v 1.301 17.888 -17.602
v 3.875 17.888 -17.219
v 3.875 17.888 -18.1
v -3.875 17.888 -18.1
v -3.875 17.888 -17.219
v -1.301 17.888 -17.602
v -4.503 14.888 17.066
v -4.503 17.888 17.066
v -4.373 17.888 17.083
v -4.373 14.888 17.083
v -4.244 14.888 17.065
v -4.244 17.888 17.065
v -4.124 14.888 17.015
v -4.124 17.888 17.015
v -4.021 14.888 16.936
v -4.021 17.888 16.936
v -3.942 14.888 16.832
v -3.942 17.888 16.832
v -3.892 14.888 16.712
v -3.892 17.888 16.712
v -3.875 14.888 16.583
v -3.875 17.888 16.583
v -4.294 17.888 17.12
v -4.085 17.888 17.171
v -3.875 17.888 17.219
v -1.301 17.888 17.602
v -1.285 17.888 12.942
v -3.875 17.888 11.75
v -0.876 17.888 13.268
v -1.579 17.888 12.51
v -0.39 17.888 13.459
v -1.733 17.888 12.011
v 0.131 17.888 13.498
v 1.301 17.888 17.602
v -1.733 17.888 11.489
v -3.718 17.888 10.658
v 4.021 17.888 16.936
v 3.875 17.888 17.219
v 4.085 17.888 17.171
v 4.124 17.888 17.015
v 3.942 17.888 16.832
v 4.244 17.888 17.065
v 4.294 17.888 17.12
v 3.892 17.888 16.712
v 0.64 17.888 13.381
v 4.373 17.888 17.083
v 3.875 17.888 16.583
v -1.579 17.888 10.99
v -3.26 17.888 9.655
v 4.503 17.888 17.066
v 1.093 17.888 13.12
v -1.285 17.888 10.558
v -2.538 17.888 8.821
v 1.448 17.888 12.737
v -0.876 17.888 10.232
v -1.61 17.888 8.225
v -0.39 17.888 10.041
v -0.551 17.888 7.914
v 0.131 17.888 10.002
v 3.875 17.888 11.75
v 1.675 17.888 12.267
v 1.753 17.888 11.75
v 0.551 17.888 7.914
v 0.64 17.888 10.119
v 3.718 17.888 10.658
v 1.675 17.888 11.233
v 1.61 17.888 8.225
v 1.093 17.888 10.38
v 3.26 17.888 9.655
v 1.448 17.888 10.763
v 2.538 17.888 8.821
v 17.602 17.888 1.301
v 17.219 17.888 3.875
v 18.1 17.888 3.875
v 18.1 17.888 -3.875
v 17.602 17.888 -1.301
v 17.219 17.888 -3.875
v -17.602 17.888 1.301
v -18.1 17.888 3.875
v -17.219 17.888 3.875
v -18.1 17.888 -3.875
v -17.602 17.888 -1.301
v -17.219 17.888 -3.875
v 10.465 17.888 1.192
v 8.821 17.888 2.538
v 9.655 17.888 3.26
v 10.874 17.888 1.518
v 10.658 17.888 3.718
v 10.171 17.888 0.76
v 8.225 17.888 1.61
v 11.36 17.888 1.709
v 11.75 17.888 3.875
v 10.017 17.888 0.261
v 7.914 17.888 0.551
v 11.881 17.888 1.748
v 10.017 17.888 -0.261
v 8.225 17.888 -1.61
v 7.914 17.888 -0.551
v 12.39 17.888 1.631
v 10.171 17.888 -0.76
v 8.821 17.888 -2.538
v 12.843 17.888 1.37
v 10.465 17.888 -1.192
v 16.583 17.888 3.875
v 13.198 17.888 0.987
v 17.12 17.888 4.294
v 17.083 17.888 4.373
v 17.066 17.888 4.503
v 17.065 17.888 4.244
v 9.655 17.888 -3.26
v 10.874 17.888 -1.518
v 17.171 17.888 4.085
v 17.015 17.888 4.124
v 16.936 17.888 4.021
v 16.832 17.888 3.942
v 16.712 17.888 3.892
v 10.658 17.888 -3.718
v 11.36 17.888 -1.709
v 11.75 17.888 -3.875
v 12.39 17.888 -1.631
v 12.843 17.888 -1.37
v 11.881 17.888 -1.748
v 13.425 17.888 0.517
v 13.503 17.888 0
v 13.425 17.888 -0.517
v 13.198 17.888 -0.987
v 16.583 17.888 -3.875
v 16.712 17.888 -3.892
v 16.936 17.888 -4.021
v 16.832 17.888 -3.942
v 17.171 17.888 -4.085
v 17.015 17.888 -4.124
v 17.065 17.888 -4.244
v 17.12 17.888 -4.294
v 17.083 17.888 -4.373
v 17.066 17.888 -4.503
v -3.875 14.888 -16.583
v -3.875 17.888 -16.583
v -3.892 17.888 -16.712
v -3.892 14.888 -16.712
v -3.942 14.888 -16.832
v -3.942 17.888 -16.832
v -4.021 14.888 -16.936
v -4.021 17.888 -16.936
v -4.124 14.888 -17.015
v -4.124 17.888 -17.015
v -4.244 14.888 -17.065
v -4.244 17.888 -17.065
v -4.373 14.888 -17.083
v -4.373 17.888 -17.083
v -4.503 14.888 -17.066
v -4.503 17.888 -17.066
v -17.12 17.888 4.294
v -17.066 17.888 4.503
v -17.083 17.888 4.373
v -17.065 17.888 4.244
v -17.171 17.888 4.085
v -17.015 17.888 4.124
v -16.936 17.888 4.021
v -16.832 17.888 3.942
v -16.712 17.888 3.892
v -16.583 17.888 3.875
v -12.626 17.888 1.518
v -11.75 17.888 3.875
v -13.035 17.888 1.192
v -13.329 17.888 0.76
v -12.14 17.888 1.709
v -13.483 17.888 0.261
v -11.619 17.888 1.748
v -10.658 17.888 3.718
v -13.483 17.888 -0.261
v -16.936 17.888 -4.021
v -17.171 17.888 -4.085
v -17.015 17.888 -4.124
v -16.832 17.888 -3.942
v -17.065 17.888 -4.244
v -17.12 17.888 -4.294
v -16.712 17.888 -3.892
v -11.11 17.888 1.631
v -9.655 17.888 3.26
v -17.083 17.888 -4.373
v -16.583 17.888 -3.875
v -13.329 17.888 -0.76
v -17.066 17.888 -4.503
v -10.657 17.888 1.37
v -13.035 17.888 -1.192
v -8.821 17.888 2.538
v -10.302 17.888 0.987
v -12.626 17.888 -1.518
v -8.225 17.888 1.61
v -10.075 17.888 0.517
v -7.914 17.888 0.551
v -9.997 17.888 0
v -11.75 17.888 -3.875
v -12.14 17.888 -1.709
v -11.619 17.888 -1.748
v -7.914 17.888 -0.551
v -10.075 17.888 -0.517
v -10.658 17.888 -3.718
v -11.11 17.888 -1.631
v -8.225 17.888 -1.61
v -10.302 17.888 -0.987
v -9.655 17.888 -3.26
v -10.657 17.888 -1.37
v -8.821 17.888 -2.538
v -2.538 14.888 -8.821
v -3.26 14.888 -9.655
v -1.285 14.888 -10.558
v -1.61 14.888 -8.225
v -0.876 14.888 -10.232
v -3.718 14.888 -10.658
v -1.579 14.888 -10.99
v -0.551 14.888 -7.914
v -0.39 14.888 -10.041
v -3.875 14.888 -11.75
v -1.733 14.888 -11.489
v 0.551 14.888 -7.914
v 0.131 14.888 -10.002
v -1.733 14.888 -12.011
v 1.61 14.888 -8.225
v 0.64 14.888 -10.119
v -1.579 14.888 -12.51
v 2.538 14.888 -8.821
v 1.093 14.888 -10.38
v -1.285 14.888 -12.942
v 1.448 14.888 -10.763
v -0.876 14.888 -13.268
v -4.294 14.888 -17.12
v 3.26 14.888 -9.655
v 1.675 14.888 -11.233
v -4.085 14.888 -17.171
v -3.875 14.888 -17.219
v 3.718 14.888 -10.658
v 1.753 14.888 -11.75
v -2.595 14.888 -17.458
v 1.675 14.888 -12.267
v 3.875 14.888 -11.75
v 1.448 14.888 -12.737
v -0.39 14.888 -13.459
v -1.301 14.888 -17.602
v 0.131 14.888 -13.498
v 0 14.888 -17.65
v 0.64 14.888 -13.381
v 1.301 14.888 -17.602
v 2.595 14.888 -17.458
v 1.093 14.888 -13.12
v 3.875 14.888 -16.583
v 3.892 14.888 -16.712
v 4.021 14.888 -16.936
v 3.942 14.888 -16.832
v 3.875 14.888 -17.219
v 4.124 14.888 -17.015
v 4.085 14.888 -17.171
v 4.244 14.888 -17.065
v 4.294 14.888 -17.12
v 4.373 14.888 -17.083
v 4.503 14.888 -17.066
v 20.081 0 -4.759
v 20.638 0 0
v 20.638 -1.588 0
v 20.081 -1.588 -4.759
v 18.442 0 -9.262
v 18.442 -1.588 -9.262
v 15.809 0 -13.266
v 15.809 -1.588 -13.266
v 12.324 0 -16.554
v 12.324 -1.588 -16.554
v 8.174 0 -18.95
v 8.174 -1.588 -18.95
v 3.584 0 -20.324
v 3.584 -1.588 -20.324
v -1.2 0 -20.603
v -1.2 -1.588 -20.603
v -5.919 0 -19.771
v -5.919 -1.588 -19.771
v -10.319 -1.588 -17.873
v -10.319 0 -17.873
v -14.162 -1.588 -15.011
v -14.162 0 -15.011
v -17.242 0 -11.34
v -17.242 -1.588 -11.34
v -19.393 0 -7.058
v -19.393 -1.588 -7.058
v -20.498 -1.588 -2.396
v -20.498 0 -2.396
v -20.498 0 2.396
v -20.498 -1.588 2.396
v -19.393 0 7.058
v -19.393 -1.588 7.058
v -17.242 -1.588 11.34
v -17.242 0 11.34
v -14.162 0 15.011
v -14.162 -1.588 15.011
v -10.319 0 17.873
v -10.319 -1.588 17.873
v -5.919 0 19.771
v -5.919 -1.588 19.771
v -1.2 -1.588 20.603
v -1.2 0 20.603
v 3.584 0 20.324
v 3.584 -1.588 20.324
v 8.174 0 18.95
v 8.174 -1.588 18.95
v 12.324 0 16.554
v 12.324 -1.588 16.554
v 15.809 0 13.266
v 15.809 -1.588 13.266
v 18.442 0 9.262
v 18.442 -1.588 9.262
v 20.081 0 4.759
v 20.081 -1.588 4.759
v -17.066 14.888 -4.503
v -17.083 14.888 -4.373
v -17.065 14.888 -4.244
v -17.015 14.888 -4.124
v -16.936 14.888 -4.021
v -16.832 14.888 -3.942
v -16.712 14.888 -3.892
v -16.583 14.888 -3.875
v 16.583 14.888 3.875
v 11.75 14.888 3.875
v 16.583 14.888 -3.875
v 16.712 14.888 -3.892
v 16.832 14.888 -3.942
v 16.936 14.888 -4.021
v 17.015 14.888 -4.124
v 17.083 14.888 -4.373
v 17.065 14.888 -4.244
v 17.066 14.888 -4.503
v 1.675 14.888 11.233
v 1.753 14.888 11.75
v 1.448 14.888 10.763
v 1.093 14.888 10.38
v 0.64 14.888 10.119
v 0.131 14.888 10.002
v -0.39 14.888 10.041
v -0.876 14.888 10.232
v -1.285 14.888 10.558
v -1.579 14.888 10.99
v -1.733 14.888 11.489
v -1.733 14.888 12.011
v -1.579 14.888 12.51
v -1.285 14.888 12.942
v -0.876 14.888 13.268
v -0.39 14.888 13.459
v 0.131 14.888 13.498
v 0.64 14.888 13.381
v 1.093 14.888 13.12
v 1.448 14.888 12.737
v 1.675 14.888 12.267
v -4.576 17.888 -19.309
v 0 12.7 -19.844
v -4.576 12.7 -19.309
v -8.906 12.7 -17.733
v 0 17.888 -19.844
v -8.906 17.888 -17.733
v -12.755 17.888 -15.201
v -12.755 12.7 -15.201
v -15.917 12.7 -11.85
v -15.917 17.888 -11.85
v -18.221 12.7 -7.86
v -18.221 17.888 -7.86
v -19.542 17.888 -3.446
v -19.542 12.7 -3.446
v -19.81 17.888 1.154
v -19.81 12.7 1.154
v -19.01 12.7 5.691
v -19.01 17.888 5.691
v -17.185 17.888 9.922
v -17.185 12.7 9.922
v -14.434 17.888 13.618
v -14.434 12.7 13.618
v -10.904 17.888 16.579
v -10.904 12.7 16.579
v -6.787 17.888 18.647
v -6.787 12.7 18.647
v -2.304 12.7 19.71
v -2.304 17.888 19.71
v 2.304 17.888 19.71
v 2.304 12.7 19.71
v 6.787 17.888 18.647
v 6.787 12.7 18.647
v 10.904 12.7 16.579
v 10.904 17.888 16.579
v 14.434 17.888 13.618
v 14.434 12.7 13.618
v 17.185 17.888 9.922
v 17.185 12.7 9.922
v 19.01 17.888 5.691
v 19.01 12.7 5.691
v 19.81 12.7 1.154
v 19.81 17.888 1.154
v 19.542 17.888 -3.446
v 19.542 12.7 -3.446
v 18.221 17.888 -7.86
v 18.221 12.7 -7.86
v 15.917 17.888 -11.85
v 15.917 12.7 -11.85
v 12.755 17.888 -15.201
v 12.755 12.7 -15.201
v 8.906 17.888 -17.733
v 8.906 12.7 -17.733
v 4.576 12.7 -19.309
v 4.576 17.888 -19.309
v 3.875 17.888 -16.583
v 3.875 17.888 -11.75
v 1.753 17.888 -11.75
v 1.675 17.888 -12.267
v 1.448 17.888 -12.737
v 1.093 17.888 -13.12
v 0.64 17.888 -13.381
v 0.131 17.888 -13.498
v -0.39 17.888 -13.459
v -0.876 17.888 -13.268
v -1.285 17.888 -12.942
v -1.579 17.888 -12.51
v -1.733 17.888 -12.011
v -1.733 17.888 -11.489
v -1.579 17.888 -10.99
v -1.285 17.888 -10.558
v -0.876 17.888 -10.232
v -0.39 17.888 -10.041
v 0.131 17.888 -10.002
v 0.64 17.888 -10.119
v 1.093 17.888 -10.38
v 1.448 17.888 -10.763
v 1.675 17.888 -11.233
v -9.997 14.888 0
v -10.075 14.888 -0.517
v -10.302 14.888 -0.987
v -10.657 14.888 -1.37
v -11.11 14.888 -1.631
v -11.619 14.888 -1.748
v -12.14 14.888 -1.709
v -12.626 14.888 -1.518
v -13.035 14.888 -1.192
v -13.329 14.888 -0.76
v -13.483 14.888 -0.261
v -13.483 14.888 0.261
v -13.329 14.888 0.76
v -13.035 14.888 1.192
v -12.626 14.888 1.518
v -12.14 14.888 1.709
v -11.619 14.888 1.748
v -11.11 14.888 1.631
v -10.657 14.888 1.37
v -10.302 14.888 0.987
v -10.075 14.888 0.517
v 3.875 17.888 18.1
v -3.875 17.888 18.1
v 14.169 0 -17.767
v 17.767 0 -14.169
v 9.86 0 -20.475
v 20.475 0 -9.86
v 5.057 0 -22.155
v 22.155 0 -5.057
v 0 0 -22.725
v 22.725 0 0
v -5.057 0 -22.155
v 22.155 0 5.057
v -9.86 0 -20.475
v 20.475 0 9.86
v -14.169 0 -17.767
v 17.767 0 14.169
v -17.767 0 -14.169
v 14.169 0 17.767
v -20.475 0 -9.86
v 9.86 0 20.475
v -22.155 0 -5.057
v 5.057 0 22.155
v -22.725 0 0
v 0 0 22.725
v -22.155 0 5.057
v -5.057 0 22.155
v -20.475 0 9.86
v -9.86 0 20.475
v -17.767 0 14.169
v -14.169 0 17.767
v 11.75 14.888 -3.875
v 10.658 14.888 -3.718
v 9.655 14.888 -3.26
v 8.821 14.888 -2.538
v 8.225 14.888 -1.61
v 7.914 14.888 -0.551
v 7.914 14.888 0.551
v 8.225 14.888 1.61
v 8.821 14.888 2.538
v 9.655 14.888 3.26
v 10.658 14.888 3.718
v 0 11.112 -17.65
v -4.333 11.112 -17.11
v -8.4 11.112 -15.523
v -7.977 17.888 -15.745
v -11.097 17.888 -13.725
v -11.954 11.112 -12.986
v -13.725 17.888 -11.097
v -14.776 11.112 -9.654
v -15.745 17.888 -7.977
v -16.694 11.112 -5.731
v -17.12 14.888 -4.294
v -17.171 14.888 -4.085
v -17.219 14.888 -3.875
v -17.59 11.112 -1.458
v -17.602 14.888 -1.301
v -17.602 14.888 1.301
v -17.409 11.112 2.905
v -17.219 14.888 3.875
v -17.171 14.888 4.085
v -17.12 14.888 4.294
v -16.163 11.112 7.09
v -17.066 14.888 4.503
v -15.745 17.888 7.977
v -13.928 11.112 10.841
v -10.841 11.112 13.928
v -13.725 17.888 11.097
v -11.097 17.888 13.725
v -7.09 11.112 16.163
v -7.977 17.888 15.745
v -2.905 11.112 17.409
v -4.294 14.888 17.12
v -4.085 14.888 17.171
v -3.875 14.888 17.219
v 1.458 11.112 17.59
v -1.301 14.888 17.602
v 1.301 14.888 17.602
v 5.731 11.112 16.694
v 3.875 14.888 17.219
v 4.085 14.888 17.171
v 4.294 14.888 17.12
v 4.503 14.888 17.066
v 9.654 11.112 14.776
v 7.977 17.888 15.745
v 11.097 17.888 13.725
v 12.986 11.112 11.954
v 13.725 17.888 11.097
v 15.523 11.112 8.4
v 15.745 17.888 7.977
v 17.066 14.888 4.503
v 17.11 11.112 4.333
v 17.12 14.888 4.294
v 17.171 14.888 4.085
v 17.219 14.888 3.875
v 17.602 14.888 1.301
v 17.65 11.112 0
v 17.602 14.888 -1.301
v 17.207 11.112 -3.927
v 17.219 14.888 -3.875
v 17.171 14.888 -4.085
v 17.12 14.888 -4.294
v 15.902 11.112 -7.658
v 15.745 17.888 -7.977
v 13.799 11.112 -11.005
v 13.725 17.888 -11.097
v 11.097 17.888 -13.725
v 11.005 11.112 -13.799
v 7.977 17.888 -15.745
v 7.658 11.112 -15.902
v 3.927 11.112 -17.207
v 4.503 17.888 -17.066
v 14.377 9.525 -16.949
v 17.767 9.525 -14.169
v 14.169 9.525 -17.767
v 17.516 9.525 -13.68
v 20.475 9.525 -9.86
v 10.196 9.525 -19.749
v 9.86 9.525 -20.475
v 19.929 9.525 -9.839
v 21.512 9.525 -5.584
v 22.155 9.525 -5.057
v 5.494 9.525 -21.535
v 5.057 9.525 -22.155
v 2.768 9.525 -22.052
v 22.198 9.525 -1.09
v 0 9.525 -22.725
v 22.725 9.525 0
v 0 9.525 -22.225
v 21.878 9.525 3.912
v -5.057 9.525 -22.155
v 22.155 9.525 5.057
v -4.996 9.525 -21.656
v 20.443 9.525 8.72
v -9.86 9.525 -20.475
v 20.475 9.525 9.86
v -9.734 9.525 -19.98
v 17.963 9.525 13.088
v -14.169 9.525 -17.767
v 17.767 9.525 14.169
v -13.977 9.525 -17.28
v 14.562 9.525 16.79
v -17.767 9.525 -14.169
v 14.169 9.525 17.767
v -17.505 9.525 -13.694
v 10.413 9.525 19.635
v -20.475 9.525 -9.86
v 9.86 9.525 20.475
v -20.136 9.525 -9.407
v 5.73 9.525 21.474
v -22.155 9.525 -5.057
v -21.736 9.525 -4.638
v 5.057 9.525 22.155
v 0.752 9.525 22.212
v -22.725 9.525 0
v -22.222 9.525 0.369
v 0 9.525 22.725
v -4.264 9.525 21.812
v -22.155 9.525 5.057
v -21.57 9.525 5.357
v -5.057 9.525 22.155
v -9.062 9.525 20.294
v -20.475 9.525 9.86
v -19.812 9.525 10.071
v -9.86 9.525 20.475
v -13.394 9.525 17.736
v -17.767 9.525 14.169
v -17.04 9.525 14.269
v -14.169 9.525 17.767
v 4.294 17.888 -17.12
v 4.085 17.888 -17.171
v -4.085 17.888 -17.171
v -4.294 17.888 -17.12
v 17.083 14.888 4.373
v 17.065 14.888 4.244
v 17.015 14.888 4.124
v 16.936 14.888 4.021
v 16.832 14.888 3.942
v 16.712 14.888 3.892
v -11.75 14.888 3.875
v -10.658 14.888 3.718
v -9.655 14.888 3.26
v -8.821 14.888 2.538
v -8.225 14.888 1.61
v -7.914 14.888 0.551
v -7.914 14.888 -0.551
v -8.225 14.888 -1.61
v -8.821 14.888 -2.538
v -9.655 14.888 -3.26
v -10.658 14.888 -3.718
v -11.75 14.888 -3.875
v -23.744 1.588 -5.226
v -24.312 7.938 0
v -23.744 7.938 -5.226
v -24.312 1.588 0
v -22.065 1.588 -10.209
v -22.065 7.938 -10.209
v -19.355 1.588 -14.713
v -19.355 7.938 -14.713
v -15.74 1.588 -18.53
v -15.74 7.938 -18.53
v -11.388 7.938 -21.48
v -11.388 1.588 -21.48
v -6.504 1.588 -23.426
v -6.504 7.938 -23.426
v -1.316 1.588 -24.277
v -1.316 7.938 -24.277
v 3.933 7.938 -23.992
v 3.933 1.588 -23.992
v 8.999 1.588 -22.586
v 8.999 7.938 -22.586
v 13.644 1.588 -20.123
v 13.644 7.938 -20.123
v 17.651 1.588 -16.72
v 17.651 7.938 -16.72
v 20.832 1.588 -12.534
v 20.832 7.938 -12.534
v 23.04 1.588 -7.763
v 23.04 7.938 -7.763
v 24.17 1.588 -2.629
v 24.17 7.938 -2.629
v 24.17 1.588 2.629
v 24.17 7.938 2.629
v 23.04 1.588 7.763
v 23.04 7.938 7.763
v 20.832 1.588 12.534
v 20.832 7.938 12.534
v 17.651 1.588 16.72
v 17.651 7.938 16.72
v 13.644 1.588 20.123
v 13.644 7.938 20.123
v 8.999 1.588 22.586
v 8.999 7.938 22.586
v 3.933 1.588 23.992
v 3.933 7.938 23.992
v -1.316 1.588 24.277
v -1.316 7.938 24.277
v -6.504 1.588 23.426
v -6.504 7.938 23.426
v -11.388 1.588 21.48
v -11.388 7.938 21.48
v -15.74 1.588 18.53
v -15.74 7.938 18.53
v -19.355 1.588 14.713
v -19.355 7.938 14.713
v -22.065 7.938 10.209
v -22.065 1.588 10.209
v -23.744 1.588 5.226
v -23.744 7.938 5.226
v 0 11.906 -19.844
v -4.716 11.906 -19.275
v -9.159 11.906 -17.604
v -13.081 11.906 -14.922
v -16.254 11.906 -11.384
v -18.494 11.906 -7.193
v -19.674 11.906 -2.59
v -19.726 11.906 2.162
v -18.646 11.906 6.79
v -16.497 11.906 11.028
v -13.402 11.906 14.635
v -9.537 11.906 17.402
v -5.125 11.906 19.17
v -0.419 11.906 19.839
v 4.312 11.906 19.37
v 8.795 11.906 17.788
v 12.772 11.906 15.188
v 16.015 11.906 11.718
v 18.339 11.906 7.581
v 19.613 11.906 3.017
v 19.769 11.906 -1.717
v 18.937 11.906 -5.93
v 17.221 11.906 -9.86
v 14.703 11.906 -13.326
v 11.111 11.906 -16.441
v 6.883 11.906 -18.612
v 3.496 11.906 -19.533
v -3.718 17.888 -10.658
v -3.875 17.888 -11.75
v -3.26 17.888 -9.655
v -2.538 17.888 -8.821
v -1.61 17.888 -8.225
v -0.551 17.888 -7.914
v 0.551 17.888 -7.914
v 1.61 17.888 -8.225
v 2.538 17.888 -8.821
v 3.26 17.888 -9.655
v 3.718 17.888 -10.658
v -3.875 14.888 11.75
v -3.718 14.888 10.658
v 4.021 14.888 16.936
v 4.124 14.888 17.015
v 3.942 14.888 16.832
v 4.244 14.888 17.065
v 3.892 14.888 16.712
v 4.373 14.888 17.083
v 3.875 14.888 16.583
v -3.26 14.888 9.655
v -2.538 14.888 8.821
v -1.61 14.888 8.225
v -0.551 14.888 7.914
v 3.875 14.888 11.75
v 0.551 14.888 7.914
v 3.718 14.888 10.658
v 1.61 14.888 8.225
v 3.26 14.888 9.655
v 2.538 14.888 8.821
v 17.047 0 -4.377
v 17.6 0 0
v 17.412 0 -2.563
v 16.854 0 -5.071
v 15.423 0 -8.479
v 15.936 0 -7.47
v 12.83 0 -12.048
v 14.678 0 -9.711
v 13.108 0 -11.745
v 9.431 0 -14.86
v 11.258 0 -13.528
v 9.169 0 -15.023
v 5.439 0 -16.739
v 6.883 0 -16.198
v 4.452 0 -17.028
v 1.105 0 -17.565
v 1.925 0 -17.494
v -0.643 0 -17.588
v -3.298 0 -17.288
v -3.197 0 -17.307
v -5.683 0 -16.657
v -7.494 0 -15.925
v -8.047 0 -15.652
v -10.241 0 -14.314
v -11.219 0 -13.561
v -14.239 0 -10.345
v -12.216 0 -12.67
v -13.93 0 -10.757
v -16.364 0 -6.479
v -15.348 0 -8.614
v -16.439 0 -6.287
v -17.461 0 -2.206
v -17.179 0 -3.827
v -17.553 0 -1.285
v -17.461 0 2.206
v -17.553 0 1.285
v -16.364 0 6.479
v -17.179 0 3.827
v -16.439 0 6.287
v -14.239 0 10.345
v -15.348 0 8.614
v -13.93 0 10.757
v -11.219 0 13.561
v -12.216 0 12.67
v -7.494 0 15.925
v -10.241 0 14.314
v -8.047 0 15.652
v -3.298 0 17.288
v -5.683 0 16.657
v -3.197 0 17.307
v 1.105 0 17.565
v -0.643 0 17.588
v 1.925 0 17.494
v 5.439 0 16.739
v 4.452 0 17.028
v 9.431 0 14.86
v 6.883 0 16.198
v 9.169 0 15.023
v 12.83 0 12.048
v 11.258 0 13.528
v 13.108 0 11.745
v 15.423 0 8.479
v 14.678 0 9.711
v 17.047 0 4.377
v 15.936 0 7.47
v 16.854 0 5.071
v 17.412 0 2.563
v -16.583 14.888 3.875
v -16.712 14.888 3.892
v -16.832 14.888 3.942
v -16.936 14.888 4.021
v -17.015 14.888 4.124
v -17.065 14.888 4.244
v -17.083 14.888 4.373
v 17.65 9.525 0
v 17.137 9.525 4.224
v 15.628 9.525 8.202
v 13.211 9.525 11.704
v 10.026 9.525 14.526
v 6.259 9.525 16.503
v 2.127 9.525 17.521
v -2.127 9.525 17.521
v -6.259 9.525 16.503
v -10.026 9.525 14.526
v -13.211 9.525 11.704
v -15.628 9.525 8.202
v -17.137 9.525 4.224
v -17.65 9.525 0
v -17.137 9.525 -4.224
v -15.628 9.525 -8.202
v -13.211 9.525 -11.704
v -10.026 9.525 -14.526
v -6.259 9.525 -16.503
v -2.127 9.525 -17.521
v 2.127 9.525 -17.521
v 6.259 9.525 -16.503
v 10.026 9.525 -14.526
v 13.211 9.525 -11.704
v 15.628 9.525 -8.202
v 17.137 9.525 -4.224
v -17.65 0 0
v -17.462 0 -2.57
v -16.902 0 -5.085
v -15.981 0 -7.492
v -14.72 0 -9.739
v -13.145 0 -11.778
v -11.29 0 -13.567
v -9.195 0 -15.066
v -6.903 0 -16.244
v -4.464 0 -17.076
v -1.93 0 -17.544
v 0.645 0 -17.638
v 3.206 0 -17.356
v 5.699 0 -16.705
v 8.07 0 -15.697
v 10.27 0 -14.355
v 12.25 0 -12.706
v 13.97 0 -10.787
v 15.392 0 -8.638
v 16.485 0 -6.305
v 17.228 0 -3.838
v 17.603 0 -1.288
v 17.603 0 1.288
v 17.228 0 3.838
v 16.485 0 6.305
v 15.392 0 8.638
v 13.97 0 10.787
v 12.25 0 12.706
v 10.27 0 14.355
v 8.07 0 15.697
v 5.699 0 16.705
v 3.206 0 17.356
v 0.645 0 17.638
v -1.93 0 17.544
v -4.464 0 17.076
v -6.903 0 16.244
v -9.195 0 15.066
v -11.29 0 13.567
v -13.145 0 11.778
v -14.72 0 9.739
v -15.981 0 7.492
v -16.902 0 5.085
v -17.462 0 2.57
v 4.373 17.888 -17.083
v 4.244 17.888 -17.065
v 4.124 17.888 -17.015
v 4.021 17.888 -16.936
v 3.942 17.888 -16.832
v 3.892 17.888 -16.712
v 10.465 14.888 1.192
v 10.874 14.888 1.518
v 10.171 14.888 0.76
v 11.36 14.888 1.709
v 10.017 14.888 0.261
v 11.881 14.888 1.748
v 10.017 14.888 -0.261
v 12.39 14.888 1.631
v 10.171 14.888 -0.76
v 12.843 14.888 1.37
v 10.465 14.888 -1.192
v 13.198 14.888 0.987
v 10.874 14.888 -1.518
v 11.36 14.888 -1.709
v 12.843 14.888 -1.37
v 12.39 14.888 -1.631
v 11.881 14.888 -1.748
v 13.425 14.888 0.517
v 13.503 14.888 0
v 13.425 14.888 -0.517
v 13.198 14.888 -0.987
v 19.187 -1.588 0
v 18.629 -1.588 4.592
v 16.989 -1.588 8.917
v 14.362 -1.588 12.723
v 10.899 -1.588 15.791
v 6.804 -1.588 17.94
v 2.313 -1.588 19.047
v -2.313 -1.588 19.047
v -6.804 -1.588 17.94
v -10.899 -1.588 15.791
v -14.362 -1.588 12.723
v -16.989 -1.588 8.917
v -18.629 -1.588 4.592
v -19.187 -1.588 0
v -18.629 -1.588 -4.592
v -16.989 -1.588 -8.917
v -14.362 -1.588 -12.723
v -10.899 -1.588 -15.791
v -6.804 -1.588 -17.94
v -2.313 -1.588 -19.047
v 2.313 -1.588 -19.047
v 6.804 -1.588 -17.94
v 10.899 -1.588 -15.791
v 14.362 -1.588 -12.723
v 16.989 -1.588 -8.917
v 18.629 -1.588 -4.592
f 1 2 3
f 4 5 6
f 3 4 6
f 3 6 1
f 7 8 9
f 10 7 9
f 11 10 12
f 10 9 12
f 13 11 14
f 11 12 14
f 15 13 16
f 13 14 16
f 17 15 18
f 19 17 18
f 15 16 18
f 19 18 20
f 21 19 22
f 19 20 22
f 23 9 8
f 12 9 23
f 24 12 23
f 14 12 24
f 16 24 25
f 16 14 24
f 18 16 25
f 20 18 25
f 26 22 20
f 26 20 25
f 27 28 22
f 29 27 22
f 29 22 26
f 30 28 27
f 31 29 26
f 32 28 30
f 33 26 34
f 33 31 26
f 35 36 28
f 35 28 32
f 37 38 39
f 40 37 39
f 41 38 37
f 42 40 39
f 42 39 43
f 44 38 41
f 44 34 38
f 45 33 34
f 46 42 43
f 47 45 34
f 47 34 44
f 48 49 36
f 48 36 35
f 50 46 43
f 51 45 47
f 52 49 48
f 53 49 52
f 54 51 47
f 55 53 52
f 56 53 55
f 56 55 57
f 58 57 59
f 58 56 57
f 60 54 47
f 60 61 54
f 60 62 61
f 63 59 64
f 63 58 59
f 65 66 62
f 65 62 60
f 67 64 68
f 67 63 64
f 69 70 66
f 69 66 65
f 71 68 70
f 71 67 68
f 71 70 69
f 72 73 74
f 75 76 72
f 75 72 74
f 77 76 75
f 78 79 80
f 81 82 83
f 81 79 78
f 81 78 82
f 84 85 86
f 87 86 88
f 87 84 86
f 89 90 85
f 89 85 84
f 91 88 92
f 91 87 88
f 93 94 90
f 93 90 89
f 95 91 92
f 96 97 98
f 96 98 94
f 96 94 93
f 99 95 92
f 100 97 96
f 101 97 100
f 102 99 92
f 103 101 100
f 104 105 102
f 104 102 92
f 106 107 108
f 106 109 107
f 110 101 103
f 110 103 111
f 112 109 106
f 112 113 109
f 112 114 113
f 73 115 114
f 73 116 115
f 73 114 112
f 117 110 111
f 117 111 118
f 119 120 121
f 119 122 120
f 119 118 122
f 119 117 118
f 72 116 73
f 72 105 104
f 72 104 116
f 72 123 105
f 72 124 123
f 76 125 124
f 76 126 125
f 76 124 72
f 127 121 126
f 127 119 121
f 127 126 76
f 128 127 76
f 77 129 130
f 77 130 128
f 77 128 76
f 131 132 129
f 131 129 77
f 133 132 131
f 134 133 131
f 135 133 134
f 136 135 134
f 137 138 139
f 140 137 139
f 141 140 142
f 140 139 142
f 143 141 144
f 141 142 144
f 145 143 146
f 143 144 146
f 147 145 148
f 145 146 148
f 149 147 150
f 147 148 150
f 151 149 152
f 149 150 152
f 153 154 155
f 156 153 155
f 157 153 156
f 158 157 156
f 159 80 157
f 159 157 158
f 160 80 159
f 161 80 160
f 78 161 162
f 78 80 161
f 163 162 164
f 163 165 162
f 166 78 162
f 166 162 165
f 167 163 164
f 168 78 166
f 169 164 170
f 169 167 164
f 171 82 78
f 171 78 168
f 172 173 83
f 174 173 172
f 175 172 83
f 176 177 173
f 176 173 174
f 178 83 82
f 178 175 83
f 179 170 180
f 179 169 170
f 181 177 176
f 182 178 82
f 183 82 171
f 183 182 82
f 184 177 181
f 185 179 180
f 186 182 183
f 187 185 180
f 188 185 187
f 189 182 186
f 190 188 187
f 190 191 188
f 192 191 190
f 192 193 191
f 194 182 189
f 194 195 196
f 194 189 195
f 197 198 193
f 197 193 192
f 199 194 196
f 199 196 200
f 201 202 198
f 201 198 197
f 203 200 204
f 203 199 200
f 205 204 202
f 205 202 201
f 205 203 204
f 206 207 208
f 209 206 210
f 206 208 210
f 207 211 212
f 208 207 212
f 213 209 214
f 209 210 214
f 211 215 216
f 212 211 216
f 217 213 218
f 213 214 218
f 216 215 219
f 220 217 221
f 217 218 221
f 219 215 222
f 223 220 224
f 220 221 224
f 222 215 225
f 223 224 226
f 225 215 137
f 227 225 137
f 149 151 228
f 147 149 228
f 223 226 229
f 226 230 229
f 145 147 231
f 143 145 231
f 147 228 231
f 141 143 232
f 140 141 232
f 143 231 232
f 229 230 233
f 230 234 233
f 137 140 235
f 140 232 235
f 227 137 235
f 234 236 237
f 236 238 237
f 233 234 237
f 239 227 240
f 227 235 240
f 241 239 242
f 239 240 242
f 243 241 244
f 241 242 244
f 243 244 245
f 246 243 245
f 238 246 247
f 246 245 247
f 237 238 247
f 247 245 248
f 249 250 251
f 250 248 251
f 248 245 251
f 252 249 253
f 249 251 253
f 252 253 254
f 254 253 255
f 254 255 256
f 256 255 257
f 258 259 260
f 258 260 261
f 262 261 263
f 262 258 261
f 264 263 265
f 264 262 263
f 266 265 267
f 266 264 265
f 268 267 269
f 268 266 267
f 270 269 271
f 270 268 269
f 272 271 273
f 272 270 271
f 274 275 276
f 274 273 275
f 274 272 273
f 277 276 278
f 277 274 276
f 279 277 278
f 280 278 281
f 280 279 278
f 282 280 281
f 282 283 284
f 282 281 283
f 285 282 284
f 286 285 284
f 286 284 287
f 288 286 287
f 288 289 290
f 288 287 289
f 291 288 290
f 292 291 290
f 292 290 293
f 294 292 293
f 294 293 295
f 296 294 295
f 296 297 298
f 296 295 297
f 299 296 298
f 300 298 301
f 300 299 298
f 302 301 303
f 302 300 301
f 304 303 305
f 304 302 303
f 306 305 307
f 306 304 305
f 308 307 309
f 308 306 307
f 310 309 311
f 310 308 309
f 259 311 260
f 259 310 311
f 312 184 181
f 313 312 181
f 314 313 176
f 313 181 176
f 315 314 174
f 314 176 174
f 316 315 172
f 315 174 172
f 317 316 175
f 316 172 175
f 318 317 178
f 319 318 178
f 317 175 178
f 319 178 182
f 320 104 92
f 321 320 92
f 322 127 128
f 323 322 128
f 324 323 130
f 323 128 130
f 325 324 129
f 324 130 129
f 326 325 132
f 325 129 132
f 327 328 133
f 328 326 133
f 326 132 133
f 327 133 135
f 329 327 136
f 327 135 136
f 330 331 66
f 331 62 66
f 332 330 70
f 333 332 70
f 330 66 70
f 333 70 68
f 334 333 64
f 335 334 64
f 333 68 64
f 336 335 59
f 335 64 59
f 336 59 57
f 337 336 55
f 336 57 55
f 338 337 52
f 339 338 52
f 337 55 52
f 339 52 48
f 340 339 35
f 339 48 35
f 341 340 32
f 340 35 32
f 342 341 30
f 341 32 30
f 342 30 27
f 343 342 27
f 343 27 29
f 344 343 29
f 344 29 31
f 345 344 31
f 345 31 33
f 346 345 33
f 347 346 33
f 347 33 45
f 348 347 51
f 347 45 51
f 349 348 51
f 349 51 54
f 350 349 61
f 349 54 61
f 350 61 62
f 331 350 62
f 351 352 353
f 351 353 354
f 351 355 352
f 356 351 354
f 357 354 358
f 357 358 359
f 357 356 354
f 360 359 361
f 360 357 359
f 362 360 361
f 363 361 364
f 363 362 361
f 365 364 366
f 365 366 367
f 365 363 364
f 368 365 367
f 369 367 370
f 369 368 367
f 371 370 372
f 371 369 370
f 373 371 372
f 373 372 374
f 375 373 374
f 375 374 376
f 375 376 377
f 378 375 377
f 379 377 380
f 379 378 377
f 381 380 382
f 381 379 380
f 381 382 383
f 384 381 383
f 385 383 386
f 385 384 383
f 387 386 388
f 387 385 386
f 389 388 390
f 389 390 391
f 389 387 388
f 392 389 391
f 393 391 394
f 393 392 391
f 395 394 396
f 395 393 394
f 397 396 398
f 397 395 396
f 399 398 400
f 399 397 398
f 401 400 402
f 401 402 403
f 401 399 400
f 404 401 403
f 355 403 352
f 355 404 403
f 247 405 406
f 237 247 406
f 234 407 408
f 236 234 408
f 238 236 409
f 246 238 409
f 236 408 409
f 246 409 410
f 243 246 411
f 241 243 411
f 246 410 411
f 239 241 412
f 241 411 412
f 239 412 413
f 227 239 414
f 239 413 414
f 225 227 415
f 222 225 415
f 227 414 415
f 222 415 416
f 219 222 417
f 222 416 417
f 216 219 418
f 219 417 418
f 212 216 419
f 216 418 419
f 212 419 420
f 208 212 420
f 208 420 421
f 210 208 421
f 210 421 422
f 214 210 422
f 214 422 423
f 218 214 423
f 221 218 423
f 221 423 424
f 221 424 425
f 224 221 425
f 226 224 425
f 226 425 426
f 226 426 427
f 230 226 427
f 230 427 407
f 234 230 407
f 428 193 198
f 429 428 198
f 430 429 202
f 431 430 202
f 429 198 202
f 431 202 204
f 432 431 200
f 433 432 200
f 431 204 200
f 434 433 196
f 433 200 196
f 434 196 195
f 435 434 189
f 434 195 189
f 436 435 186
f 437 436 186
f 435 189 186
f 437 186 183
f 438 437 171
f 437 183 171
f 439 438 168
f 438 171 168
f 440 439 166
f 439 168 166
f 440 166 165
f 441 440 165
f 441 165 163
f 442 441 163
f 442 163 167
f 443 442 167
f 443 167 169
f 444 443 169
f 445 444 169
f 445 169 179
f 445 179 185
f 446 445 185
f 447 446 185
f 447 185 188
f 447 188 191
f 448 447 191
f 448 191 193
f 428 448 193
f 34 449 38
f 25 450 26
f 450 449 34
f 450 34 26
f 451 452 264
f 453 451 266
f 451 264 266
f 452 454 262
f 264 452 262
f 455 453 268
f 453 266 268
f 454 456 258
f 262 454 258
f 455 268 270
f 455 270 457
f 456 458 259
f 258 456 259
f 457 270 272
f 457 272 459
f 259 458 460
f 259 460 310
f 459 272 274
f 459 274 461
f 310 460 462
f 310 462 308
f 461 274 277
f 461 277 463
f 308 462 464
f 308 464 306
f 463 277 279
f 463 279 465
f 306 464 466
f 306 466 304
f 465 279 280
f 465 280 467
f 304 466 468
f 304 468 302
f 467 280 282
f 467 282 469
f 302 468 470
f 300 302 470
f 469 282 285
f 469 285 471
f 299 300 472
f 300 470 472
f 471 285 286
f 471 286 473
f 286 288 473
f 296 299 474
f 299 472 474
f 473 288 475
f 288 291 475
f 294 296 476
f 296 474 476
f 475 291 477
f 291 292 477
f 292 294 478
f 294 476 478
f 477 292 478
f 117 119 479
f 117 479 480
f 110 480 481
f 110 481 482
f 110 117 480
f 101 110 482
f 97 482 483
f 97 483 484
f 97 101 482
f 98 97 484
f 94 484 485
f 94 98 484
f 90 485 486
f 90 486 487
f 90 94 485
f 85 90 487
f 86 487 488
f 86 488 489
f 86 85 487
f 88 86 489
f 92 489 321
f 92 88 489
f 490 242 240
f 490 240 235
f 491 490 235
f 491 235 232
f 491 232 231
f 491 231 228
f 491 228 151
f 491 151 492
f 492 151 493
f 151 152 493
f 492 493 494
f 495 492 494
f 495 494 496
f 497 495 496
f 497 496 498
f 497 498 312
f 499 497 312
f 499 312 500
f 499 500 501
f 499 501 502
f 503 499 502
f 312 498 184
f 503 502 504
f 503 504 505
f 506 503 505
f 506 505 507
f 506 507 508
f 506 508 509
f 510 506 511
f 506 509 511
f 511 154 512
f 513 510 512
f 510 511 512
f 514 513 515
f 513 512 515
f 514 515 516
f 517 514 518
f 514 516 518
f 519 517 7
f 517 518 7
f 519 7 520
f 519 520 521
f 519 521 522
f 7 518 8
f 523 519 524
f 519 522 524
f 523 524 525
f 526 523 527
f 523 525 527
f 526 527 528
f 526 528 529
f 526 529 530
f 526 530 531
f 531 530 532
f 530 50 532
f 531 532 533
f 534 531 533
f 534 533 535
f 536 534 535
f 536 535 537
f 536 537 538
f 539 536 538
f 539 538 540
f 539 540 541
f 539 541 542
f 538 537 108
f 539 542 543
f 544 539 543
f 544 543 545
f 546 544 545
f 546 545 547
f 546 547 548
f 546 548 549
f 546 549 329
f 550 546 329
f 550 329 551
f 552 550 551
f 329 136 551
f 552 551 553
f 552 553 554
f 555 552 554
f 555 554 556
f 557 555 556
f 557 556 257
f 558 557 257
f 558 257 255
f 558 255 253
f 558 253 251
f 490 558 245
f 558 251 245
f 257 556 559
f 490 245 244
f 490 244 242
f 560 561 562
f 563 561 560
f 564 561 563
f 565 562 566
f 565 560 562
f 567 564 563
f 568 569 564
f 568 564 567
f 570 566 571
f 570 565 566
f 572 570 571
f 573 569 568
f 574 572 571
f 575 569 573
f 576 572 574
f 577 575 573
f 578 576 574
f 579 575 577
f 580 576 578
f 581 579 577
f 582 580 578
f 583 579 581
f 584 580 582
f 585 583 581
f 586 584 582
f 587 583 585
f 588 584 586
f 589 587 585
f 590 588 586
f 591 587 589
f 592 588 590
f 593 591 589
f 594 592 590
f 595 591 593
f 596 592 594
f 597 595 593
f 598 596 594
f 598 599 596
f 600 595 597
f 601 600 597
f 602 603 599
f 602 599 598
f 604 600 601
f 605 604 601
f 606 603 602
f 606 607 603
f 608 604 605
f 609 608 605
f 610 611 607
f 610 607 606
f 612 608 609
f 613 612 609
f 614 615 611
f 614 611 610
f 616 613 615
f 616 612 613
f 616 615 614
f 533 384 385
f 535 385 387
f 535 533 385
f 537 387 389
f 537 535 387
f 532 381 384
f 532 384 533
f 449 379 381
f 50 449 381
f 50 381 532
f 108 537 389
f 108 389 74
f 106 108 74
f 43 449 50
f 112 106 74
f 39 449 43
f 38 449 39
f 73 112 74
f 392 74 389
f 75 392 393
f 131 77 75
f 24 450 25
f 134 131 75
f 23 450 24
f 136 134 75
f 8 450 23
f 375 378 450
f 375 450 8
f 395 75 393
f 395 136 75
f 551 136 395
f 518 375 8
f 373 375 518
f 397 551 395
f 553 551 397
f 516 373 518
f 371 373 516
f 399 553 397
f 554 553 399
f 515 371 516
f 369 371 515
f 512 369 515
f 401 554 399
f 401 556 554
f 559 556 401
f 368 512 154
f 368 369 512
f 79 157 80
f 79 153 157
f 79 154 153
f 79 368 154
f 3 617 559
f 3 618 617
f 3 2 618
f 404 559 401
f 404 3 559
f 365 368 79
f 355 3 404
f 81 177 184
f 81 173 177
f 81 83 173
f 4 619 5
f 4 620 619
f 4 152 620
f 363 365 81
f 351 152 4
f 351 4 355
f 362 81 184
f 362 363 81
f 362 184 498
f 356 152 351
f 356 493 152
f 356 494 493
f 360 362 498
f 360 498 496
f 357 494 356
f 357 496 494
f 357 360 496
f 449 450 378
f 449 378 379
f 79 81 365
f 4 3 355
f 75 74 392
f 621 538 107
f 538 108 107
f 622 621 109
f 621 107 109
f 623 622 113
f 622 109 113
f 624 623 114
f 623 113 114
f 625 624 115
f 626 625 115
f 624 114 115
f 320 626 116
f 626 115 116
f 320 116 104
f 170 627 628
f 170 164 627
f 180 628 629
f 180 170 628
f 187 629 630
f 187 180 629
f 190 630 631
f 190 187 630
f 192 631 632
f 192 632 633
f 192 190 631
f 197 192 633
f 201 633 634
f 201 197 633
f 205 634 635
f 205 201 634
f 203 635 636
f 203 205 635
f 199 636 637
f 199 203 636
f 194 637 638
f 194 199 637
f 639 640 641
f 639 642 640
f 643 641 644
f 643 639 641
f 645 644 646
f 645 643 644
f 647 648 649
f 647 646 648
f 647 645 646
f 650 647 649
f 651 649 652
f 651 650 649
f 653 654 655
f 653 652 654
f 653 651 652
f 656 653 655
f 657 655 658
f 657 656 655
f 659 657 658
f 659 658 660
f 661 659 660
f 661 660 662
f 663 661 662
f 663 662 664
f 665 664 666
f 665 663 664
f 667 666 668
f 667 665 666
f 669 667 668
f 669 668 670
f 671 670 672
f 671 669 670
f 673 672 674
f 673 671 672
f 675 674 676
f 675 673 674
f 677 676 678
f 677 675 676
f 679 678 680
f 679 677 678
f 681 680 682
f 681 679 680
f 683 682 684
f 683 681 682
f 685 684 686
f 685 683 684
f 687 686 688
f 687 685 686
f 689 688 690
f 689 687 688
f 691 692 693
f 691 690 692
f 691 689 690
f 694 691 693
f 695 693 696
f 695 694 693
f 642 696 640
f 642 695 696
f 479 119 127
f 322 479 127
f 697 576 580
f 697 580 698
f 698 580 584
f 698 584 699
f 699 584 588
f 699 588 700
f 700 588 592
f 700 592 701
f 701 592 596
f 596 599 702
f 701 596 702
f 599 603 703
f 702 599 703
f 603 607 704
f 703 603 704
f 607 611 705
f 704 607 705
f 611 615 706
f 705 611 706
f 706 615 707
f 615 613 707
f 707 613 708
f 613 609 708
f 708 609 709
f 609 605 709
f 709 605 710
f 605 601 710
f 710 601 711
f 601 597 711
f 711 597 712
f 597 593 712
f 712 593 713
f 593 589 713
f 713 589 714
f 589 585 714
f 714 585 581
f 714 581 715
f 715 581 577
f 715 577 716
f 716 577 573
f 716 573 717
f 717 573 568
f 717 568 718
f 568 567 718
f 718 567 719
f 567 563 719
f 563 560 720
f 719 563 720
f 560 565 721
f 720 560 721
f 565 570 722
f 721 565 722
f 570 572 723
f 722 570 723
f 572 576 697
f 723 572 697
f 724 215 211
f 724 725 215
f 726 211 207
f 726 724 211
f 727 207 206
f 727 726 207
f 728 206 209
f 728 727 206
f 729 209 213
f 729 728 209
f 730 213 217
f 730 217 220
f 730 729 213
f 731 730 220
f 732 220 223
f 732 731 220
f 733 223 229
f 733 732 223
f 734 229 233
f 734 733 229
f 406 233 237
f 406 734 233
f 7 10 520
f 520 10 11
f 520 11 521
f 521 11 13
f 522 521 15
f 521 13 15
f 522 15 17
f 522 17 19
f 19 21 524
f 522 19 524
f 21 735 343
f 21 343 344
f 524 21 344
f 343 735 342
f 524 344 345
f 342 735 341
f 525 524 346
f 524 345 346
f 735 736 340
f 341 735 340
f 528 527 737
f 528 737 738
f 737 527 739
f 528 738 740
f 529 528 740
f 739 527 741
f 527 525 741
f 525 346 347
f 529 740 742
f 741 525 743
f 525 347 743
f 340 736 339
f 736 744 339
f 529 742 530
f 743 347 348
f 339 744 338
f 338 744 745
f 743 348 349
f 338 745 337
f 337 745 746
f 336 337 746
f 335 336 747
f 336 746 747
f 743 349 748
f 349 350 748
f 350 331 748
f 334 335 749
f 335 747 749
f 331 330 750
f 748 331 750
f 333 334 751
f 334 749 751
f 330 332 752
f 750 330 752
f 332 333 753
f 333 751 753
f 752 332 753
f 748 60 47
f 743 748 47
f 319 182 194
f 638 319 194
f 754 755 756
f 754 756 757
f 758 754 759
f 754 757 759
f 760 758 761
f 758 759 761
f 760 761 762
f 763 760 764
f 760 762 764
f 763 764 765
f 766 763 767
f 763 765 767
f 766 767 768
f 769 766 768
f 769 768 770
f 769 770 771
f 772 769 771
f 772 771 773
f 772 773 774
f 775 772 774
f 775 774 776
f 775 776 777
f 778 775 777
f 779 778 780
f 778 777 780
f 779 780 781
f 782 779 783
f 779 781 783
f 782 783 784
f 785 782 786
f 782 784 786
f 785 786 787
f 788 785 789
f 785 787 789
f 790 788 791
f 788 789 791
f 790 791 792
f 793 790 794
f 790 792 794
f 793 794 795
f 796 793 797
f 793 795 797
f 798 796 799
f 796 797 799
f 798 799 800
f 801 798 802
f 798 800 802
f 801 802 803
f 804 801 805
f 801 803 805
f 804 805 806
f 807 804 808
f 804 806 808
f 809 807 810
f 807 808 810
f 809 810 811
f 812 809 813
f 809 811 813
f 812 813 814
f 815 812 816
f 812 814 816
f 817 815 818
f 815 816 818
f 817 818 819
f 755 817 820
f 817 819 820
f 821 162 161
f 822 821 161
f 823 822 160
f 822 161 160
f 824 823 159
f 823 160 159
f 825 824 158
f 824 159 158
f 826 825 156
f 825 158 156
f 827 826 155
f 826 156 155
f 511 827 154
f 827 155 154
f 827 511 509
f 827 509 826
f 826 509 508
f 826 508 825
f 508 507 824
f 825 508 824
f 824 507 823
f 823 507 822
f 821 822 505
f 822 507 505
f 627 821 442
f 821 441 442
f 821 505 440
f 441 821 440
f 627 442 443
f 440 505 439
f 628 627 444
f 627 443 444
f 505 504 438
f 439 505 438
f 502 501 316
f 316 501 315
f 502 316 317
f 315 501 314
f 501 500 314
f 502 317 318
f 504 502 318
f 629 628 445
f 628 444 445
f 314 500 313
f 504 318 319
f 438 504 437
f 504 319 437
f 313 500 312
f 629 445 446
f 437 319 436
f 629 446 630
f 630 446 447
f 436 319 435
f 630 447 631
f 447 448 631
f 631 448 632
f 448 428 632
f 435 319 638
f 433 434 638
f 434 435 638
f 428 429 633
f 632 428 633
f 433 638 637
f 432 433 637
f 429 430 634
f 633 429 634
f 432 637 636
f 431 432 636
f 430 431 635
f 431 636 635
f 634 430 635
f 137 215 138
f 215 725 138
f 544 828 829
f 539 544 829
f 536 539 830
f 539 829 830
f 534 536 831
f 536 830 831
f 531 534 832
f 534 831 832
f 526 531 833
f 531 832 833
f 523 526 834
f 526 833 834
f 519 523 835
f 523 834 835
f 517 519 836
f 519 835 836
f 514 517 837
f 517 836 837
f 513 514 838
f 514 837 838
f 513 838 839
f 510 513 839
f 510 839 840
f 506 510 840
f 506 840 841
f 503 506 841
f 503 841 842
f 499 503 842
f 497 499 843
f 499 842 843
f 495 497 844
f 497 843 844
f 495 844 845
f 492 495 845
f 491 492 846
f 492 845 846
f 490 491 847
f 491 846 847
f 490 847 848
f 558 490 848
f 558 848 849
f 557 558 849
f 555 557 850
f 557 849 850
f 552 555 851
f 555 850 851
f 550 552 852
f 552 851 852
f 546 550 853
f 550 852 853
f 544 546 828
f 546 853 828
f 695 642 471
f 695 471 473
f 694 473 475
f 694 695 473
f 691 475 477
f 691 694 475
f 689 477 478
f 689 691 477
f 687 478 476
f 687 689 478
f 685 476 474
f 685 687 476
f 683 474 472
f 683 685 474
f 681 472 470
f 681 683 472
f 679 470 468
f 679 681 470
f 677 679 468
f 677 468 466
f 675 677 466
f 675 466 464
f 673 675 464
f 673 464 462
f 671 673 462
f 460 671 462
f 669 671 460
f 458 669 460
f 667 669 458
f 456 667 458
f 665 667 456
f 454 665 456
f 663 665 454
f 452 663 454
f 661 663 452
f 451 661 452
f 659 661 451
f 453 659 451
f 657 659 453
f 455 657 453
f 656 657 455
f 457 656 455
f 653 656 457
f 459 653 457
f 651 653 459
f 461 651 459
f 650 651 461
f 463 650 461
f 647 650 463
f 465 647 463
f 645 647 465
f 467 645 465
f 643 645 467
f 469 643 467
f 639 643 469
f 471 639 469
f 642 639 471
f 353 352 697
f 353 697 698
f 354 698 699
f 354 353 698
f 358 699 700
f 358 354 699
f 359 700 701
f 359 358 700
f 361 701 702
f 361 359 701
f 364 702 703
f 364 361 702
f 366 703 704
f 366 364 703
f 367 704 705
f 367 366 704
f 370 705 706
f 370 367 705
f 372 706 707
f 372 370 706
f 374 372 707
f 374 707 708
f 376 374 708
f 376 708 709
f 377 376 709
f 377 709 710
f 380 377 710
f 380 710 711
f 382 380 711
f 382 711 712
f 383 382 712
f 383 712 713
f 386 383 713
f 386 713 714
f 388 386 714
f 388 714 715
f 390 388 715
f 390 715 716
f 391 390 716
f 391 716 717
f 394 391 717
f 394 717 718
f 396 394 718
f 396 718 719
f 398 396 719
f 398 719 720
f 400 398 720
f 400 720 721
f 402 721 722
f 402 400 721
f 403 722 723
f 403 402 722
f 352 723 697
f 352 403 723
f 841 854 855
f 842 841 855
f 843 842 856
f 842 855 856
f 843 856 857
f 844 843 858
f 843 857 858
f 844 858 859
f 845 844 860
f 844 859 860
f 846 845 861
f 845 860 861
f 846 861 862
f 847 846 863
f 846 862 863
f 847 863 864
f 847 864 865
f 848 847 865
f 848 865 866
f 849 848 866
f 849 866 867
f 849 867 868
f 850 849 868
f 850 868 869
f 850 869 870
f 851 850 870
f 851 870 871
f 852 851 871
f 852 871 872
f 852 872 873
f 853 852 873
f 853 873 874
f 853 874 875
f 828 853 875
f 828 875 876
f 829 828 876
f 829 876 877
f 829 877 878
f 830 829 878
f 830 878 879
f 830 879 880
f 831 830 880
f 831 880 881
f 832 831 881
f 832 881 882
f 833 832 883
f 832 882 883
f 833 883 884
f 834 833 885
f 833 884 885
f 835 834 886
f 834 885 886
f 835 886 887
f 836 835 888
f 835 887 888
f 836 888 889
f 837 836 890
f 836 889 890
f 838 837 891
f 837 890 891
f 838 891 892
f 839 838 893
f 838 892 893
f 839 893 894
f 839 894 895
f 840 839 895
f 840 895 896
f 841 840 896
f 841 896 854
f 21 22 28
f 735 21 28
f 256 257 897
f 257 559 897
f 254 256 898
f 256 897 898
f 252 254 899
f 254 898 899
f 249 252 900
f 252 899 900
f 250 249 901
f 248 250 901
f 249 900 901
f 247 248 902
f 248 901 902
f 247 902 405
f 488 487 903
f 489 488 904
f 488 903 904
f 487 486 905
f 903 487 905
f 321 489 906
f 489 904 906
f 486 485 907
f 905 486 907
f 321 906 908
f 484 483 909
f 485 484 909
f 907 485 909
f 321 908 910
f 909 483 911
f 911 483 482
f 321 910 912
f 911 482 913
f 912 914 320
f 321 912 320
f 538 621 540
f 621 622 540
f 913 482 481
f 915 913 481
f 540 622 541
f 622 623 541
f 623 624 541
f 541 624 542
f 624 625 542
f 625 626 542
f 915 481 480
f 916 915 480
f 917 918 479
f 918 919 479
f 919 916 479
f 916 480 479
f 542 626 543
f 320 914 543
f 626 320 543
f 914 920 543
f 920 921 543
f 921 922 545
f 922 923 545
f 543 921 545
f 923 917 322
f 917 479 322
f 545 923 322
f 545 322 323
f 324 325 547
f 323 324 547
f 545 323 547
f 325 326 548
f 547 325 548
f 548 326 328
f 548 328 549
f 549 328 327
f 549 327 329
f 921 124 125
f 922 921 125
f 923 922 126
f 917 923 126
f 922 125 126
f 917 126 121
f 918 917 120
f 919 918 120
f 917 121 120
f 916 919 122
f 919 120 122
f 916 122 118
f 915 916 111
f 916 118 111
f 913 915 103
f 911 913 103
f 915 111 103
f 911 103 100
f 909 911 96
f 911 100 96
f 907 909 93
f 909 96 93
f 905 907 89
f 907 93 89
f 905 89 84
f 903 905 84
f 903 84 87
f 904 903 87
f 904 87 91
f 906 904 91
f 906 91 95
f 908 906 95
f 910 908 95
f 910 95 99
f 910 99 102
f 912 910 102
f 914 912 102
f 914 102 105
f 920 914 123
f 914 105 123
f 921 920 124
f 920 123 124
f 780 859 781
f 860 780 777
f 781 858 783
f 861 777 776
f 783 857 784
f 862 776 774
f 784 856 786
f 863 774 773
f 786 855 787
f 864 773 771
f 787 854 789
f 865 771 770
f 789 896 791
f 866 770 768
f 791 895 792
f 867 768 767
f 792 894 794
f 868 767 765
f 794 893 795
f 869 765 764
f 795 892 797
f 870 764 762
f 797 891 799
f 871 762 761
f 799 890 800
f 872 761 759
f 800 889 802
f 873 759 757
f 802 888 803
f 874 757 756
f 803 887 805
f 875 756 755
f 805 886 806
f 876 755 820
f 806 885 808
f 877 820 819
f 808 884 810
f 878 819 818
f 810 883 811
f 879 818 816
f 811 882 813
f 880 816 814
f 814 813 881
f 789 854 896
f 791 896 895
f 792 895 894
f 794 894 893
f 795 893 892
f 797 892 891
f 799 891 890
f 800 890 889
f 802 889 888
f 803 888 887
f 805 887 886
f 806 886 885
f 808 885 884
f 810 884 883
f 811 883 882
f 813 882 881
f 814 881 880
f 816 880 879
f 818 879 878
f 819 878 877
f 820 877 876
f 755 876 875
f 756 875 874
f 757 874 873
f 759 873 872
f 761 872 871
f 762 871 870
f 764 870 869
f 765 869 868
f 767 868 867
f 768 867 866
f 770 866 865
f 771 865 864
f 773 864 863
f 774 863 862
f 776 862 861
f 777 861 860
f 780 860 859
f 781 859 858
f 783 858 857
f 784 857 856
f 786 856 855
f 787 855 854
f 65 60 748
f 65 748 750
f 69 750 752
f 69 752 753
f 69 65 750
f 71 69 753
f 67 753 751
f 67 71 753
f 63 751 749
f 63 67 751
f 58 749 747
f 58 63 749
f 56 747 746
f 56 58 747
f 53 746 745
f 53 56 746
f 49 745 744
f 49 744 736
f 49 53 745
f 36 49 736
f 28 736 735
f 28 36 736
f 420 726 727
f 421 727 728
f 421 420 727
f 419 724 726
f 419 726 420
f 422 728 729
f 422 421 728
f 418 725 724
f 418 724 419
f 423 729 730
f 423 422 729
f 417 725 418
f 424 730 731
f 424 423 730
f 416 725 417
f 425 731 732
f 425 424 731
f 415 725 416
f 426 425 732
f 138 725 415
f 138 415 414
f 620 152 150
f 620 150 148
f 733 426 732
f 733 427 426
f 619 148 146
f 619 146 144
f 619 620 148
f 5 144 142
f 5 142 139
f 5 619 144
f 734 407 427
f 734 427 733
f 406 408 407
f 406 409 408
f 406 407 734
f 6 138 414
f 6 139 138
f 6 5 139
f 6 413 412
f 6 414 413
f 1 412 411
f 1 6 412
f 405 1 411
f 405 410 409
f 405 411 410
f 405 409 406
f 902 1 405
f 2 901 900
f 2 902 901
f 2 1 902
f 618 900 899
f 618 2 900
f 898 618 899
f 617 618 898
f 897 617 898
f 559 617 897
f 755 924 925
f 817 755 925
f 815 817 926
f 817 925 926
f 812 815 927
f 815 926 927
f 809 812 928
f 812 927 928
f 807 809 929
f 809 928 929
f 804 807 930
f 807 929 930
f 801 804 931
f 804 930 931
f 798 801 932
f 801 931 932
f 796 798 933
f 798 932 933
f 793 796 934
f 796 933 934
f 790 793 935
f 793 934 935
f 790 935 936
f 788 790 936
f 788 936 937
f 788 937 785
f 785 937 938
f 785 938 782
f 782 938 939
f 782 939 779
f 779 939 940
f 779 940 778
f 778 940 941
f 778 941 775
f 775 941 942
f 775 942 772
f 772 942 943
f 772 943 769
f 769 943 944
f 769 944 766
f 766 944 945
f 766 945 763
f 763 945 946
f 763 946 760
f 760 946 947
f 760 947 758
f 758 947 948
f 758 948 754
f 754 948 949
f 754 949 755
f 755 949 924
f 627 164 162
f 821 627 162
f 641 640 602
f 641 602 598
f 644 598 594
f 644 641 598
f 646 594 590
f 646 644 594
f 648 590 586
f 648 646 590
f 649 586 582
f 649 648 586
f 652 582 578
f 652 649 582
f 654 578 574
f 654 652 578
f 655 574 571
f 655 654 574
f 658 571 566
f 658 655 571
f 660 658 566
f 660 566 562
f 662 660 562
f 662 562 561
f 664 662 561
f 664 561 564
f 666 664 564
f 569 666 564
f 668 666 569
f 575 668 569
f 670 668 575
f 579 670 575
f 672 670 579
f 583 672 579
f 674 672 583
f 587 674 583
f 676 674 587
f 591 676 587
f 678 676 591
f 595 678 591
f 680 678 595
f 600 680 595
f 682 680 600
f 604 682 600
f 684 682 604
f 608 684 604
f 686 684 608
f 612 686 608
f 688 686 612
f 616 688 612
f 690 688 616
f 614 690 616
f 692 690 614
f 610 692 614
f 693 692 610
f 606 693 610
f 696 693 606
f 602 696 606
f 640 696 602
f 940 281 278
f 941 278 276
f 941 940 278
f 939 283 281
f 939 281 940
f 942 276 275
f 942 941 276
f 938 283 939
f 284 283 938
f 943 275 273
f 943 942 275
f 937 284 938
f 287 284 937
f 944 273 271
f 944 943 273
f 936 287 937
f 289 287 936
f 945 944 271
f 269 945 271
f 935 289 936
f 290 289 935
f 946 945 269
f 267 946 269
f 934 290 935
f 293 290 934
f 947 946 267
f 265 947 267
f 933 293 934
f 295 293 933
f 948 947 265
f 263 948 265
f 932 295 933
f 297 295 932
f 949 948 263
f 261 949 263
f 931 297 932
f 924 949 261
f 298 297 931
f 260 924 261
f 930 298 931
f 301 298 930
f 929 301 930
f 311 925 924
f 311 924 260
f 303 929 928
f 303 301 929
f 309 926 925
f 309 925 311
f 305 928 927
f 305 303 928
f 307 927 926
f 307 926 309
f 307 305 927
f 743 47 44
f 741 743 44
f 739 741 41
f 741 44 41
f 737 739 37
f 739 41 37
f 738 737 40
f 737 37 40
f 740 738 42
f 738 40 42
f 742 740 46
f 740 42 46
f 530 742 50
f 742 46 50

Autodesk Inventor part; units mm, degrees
ref_plane "YZ Plane" through (0, 0, 0) normal (1, 0, 0) x (0, 1, 0)
ref_plane "XZ Plane" through (0, 0, 0) normal (0, 1, 0) x (-1, 0, 0)
sketch "Sketch1" plane through (0, 0, 0) normal (0, 1, 0) x (-1, 0, 0)
  circle A0 centre (0, 0) radius 22.225 construction
  circle A1 centre (0, 0) radius 17.65
  circle A2 centre (0, 0) radius 24.3125
  dimension "d0" = 44.45
  dimension "d1" = 35.3
  dimension "d2" = 48.625
extrude "Extrusion1" add sketch "Sketch1" along normal blind 9.525
sketch "Sketch2" plane through (0, 0, 0) normal (0, -1, 0) x (1, 0, 0)
  circle A0 centre (0, 0) radius 17.6
  circle A1 centre (0, 0) radius 20.6375
  dimension "d5" = 41.275
  dimension "d6" = 35.2
extrude "Extrusion2" add sketch "Sketch2" along normal blind 1.5875
sketch "Sketch3" plane through (0, 9.525, 0) normal (0, 1, 0) x (1, 0, 0)
  circle A0 centre (0, 0) radius 17.65
  circle A1 centre (0, 0) radius 19.8438
  dimension "d9" = 35.3
  dimension "d10" = 39.6875
extrude "Extrusion3" add sketch "Sketch3" along normal blind 1.5875
sketch "Sketch4" plane through (0, 0, 0) normal (1, 0, 0) x (0, 1, 0)
  line L0 (11.1125, -17.65) -> (17.8875, -17.65)
  line L1 (17.8875, -17.65) -> (17.8875, -20.6375)
  line L2 (17.8875, -20.6375) -> (11.1125, -20.6375) construction
  line L3 (11.1125, -20.6375) -> (11.1125, -17.65)
  line L4 (11.1125, -19.8438) -> (11.1125, 19.8438) projected
  line L5 (12.7, -17.65) -> (12.7, -20.6375) construction
  line L6 (11.1125, -19.8438) -> (12.7, -19.8438)
  line L7 (12.7, -19.8438) -> (17.8875, -19.8438)
  line L8 (0, 0) -> (25.7056, 0) construction
  line L9 (-11.1125, 0) -> (-11.1125, -19.8438) construction
  line L10 (0, 20.6375) -> (0, -20.6375) projected
  dimension "d13" = 17.65
  dimension "d14" = 20.6375
  dimension "d16" = 1.5875
  dimension "d18" = 19.8438
  dimension "d84" = 11.1125
  dimension "d85" = 29
revolve "Revolution1" add sketch "Sketch4" angle 360 about axis through (0, 0, 0) along (0, 1, 0)
ref_plane "Work Plane1" through (0, 4.7625, 0) normal (0, 1, 0) x (1, 0, 0)
sketch "Sketch11" plane through (0, 17.8875, 0) normal (0, 1, 0) x (1, 0, 0)
  circle A0 centre (0, 0) radius 11.75 construction
  line L0 (0, 0) -> (-11.75, 0) construction
  circle A1 centre (-11.75, 0) radius 3.875
  line L1 (-11.75, -3.875) -> (-18.1, -3.875)
  line L2 (-18.1, -3.875) -> (-18.1, 3.875)
  line L3 (-18.1, 3.875) -> (-11.75, 3.875)
  line L4 (-11.75, 3.875) -> (-11.75, -3.875) construction
  circle A2 centre (0, -11.75) radius 3.875
  line L5 (3.875, -11.75) -> (3.875, -18.1)
  line L6 (3.875, -18.1) -> (-3.875, -18.1)
  line L7 (-3.875, -18.1) -> (-3.875, -11.75)
  line L8 (-3.875, -11.75) -> (3.875, -11.75) construction
  circle A3 centre (11.75, 0) radius 3.875
  line L9 (11.75, 3.875) -> (18.1, 3.875)
  line L10 (18.1, 3.875) -> (18.1, -3.875)
  line L11 (18.1, -3.875) -> (11.75, -3.875)
  line L12 (11.75, -3.875) -> (11.75, 3.875) construction
  circle A4 centre (0, 11.75) radius 3.875
  line L13 (-3.875, 11.75) -> (-3.875, 18.1)
  line L14 (-3.875, 18.1) -> (3.875, 18.1)
  line L15 (3.875, 18.1) -> (3.875, 11.75)
  line L16 (3.875, 11.75) -> (-3.875, 11.75) construction
  circle A5 centre (0, -11.75) radius 1.7526
  circle A6 centre (11.75, 0) radius 1.7526
  circle A7 centre (0, 11.75) radius 1.7526
  circle A8 centre (-11.75, 0) radius 1.7526
  point P0 (3.875, 11.75)
  point P1 (11.75, -3.875)
  point P2 (-3.875, -11.75)
  point P3 (-11.75, 3.875)
  dimension "d121" = 23.5
  dimension "d122" = 7.75
  dimension "d123" = 6.35
  dimension "d126" = 360
  dimension "d134" = 3.5052
  dimension "d137" = 360
extrude "Extrusion10" add sketch "Sketch11" against normal blind 3
fillet "Fillet5" radius 0.5 8 edges at (-17.2194, 16.3875, -3.875) (-17.2194, 16.3875, 3.875) (-3.875, 16.3875, 17.2194) (3.875, 16.3875, 17.2194) (17.2194, 16.3875, -3.875) (17.2194, 16.3875, 3.875) (-3.875, 16.3875, -17.2194) (3.875, 16.3875, -17.2194)
chamfer "Chamfer5" distance 1.5875 angle 45 1 edges at (-17.6, -1.5875, 0)
chamfer "Chamfer6" distance 1.5875 angle 45 2 edges at (24.3125, 9.525, 0) (24.3125, 0, 0)
chamfer "Chamfer8" distance 2.3813 angle 45 1 edges at (-19.8438, 9.525, 0)
properties part number "Motor Hub" material "Nylon 6/6"
